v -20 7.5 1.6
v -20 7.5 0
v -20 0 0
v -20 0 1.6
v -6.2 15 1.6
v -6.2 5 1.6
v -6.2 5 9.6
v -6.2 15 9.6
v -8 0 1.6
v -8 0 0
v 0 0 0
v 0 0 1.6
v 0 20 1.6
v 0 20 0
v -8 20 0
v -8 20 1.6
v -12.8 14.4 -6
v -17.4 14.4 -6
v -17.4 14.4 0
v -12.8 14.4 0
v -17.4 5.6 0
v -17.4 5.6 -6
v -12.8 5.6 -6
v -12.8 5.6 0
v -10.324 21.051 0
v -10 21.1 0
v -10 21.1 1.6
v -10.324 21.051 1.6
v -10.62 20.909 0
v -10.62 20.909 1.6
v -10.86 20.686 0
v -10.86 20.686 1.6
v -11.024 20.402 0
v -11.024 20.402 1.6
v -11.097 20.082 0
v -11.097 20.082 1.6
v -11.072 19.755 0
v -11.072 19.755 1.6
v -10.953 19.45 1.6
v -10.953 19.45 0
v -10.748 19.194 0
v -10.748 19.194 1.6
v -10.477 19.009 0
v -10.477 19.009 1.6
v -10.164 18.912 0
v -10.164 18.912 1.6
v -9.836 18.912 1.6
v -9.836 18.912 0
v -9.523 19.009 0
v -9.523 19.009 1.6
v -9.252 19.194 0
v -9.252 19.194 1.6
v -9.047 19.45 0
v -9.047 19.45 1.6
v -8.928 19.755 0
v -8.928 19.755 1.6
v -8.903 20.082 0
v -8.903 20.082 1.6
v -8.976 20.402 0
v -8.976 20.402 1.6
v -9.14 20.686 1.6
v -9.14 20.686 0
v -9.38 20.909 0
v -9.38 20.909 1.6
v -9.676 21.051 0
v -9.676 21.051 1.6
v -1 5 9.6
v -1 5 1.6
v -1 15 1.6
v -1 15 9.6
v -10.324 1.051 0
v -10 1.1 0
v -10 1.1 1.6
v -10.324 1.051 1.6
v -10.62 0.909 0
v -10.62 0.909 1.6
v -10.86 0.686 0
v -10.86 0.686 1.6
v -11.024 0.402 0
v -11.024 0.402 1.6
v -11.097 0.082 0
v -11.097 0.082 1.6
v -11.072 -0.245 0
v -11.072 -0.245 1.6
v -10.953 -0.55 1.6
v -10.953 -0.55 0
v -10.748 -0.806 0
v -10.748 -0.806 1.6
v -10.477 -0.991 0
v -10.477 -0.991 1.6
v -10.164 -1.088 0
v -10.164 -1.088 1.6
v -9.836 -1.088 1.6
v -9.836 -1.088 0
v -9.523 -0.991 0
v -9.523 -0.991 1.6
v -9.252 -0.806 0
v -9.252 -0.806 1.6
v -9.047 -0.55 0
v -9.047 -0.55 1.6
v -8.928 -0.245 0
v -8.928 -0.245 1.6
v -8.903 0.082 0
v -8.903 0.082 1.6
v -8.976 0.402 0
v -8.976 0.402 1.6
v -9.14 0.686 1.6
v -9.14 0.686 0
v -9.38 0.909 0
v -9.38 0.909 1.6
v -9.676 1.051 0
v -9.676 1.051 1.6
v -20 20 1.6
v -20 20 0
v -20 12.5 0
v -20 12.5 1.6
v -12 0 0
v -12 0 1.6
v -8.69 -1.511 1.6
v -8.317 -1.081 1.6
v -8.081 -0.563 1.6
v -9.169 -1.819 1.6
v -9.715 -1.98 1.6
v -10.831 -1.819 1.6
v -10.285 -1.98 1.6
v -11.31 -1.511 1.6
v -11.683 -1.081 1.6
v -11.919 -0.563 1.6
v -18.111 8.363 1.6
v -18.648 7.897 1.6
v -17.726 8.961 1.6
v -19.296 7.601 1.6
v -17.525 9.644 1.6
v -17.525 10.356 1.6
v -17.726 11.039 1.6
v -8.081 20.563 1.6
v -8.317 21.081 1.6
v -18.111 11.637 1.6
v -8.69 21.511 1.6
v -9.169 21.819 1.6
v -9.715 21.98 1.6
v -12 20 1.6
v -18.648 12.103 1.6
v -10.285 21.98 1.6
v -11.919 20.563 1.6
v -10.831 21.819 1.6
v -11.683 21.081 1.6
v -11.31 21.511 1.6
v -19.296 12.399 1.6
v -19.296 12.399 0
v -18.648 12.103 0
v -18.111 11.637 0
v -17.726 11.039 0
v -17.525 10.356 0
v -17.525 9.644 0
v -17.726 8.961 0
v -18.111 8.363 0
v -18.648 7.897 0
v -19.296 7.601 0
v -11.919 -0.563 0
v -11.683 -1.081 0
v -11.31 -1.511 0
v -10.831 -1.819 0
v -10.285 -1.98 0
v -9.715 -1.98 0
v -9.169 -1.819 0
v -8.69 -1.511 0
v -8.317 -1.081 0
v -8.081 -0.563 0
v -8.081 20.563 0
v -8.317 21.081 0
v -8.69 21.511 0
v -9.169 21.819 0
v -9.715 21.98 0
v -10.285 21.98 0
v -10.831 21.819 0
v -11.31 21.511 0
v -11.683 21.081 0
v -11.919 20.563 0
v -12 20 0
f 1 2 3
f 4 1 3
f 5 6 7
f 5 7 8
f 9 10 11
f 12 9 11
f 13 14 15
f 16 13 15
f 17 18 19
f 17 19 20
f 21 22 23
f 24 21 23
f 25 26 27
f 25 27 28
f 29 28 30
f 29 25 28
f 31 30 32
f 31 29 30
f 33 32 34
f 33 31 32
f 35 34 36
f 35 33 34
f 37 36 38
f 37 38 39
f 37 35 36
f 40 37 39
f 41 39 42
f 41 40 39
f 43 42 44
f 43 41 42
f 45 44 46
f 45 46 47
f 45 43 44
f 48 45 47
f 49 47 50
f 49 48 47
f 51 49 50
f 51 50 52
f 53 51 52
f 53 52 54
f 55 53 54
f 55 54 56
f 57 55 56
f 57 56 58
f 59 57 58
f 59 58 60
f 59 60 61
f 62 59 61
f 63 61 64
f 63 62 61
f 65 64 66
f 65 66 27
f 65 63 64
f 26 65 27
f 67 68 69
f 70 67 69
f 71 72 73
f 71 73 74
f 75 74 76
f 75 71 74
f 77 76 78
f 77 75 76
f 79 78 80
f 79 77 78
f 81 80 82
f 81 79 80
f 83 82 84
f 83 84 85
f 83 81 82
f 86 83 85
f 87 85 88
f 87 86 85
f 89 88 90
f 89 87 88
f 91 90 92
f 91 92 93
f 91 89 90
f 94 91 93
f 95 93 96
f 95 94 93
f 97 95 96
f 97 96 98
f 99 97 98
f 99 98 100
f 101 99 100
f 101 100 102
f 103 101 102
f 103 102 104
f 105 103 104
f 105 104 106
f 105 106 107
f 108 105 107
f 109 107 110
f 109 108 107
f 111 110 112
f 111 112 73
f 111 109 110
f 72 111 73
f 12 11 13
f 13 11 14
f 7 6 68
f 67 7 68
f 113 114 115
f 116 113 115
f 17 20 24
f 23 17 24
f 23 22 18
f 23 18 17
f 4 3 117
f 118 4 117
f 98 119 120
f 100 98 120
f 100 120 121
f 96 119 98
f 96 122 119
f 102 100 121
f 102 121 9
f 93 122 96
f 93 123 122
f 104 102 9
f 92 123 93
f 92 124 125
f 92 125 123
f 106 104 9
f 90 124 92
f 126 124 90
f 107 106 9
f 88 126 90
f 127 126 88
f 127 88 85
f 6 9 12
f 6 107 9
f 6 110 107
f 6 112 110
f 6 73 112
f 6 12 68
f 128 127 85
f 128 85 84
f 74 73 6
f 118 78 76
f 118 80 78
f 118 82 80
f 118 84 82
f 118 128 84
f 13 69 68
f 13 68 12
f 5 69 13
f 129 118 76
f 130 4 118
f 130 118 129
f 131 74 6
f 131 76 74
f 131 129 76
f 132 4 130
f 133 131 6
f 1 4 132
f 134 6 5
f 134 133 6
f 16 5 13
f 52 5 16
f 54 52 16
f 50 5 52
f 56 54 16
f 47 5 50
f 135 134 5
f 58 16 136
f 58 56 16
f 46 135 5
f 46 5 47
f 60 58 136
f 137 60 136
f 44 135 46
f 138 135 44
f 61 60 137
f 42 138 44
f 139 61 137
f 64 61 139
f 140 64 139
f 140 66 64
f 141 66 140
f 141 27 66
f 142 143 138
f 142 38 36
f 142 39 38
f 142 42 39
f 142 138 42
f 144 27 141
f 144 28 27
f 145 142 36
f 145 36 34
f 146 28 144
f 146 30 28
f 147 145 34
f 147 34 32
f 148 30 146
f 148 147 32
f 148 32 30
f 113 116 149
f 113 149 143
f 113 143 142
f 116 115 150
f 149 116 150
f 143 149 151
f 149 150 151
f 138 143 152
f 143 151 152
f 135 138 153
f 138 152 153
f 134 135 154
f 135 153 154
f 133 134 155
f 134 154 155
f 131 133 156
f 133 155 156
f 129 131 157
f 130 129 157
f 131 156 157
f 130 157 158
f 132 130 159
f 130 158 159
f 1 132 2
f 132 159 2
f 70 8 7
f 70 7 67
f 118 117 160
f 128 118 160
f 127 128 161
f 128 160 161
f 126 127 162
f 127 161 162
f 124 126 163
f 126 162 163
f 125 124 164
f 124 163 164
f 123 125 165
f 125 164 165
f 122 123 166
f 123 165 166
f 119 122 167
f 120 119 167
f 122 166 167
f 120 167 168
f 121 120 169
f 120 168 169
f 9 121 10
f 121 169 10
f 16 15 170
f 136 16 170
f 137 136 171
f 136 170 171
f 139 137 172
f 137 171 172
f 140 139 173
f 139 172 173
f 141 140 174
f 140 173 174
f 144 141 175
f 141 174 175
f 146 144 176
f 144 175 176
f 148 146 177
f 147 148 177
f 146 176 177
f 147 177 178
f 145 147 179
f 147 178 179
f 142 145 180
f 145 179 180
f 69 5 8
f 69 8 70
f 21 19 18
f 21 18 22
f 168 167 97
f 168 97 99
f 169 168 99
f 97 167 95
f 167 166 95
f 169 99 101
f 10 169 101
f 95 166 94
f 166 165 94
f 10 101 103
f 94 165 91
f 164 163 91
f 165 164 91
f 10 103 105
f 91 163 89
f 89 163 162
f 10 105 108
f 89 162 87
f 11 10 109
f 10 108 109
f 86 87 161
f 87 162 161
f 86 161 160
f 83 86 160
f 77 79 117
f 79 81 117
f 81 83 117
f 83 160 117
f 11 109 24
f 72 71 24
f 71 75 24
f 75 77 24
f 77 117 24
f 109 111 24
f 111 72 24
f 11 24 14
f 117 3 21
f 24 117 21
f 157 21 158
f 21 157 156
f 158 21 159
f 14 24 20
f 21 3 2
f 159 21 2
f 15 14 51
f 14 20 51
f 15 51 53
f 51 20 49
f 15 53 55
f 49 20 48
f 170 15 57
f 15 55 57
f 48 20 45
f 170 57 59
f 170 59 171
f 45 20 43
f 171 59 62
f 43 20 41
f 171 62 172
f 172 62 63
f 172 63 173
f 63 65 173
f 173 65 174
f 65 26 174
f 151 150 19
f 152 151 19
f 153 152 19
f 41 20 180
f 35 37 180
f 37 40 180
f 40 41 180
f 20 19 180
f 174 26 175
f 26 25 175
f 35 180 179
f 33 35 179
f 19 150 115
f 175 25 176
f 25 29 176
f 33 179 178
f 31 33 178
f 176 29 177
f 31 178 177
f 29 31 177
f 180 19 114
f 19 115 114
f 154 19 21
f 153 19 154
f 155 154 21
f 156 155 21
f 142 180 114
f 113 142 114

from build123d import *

# Parameters (mm, degrees)
SKETCH_1_R      = 1.1
EXTRUDE_1_DEPTH = 1.6
SKETCH_2_W      = 4.6
SKETCH_2_H      = 8.8
EXTRUDE_2_DEPTH = 6
SKETCH_3_W      = 5.2
SKETCH_3_H      = 10
EXTRUDE_3_DEPTH = 8


with BuildPart() as part:
    # ｽｹｯﾁ1 → ﾎﾞｽ - 押し出し1 (new body)
    with BuildSketch(Plane(origin=(0, 0, 0), x_dir=(0, 1, 0), z_dir=(0, 0, 1))):
        with BuildLine():
            Line((0, 8), (0, 0))
            Line((0, 0), (20, 0))
            Line((20, 0), (20, 8))
            ThreePointArc((20, 8), (22, 10), (20, 12))
            Line((20, 12), (20, 20))
            Line((20, 20), (12.5, 20))
            ThreePointArc((12.5, 20), (10, 17.5), (7.5, 20))
            Line((7.5, 20), (0, 20))
            Line((0, 20), (0, 12))
            ThreePointArc((0, 12), (-2, 10), (0, 8))
        make_face()
        with Locations((20, 10)):
            Circle(SKETCH_1_R, mode=Mode.SUBTRACT)
        with Locations((0, 10)):
            Circle(SKETCH_1_R, mode=Mode.SUBTRACT)
    extrude(amount=EXTRUDE_1_DEPTH)

    # ｽｹｯﾁ2 → ﾎﾞｽ - 押し出し2 (add)
    with BuildSketch(Plane(origin=(0, 0, 0), x_dir=(1, 0, 0), z_dir=(0, 0, -1))):
        with Locations((-15.1, -10)):
            Rectangle(SKETCH_2_W, SKETCH_2_H)
    extrude(amount=EXTRUDE_2_DEPTH)

    # ｽｹｯﾁ3 → ﾎﾞｽ - 押し出し3 (add)
    with BuildSketch(Plane.XY.offset(1.6)):
        with Locations((-3.6, 10)):
            Rectangle(SKETCH_3_W, SKETCH_3_H)
    extrude(amount=EXTRUDE_3_DEPTH)


solid = part.part
